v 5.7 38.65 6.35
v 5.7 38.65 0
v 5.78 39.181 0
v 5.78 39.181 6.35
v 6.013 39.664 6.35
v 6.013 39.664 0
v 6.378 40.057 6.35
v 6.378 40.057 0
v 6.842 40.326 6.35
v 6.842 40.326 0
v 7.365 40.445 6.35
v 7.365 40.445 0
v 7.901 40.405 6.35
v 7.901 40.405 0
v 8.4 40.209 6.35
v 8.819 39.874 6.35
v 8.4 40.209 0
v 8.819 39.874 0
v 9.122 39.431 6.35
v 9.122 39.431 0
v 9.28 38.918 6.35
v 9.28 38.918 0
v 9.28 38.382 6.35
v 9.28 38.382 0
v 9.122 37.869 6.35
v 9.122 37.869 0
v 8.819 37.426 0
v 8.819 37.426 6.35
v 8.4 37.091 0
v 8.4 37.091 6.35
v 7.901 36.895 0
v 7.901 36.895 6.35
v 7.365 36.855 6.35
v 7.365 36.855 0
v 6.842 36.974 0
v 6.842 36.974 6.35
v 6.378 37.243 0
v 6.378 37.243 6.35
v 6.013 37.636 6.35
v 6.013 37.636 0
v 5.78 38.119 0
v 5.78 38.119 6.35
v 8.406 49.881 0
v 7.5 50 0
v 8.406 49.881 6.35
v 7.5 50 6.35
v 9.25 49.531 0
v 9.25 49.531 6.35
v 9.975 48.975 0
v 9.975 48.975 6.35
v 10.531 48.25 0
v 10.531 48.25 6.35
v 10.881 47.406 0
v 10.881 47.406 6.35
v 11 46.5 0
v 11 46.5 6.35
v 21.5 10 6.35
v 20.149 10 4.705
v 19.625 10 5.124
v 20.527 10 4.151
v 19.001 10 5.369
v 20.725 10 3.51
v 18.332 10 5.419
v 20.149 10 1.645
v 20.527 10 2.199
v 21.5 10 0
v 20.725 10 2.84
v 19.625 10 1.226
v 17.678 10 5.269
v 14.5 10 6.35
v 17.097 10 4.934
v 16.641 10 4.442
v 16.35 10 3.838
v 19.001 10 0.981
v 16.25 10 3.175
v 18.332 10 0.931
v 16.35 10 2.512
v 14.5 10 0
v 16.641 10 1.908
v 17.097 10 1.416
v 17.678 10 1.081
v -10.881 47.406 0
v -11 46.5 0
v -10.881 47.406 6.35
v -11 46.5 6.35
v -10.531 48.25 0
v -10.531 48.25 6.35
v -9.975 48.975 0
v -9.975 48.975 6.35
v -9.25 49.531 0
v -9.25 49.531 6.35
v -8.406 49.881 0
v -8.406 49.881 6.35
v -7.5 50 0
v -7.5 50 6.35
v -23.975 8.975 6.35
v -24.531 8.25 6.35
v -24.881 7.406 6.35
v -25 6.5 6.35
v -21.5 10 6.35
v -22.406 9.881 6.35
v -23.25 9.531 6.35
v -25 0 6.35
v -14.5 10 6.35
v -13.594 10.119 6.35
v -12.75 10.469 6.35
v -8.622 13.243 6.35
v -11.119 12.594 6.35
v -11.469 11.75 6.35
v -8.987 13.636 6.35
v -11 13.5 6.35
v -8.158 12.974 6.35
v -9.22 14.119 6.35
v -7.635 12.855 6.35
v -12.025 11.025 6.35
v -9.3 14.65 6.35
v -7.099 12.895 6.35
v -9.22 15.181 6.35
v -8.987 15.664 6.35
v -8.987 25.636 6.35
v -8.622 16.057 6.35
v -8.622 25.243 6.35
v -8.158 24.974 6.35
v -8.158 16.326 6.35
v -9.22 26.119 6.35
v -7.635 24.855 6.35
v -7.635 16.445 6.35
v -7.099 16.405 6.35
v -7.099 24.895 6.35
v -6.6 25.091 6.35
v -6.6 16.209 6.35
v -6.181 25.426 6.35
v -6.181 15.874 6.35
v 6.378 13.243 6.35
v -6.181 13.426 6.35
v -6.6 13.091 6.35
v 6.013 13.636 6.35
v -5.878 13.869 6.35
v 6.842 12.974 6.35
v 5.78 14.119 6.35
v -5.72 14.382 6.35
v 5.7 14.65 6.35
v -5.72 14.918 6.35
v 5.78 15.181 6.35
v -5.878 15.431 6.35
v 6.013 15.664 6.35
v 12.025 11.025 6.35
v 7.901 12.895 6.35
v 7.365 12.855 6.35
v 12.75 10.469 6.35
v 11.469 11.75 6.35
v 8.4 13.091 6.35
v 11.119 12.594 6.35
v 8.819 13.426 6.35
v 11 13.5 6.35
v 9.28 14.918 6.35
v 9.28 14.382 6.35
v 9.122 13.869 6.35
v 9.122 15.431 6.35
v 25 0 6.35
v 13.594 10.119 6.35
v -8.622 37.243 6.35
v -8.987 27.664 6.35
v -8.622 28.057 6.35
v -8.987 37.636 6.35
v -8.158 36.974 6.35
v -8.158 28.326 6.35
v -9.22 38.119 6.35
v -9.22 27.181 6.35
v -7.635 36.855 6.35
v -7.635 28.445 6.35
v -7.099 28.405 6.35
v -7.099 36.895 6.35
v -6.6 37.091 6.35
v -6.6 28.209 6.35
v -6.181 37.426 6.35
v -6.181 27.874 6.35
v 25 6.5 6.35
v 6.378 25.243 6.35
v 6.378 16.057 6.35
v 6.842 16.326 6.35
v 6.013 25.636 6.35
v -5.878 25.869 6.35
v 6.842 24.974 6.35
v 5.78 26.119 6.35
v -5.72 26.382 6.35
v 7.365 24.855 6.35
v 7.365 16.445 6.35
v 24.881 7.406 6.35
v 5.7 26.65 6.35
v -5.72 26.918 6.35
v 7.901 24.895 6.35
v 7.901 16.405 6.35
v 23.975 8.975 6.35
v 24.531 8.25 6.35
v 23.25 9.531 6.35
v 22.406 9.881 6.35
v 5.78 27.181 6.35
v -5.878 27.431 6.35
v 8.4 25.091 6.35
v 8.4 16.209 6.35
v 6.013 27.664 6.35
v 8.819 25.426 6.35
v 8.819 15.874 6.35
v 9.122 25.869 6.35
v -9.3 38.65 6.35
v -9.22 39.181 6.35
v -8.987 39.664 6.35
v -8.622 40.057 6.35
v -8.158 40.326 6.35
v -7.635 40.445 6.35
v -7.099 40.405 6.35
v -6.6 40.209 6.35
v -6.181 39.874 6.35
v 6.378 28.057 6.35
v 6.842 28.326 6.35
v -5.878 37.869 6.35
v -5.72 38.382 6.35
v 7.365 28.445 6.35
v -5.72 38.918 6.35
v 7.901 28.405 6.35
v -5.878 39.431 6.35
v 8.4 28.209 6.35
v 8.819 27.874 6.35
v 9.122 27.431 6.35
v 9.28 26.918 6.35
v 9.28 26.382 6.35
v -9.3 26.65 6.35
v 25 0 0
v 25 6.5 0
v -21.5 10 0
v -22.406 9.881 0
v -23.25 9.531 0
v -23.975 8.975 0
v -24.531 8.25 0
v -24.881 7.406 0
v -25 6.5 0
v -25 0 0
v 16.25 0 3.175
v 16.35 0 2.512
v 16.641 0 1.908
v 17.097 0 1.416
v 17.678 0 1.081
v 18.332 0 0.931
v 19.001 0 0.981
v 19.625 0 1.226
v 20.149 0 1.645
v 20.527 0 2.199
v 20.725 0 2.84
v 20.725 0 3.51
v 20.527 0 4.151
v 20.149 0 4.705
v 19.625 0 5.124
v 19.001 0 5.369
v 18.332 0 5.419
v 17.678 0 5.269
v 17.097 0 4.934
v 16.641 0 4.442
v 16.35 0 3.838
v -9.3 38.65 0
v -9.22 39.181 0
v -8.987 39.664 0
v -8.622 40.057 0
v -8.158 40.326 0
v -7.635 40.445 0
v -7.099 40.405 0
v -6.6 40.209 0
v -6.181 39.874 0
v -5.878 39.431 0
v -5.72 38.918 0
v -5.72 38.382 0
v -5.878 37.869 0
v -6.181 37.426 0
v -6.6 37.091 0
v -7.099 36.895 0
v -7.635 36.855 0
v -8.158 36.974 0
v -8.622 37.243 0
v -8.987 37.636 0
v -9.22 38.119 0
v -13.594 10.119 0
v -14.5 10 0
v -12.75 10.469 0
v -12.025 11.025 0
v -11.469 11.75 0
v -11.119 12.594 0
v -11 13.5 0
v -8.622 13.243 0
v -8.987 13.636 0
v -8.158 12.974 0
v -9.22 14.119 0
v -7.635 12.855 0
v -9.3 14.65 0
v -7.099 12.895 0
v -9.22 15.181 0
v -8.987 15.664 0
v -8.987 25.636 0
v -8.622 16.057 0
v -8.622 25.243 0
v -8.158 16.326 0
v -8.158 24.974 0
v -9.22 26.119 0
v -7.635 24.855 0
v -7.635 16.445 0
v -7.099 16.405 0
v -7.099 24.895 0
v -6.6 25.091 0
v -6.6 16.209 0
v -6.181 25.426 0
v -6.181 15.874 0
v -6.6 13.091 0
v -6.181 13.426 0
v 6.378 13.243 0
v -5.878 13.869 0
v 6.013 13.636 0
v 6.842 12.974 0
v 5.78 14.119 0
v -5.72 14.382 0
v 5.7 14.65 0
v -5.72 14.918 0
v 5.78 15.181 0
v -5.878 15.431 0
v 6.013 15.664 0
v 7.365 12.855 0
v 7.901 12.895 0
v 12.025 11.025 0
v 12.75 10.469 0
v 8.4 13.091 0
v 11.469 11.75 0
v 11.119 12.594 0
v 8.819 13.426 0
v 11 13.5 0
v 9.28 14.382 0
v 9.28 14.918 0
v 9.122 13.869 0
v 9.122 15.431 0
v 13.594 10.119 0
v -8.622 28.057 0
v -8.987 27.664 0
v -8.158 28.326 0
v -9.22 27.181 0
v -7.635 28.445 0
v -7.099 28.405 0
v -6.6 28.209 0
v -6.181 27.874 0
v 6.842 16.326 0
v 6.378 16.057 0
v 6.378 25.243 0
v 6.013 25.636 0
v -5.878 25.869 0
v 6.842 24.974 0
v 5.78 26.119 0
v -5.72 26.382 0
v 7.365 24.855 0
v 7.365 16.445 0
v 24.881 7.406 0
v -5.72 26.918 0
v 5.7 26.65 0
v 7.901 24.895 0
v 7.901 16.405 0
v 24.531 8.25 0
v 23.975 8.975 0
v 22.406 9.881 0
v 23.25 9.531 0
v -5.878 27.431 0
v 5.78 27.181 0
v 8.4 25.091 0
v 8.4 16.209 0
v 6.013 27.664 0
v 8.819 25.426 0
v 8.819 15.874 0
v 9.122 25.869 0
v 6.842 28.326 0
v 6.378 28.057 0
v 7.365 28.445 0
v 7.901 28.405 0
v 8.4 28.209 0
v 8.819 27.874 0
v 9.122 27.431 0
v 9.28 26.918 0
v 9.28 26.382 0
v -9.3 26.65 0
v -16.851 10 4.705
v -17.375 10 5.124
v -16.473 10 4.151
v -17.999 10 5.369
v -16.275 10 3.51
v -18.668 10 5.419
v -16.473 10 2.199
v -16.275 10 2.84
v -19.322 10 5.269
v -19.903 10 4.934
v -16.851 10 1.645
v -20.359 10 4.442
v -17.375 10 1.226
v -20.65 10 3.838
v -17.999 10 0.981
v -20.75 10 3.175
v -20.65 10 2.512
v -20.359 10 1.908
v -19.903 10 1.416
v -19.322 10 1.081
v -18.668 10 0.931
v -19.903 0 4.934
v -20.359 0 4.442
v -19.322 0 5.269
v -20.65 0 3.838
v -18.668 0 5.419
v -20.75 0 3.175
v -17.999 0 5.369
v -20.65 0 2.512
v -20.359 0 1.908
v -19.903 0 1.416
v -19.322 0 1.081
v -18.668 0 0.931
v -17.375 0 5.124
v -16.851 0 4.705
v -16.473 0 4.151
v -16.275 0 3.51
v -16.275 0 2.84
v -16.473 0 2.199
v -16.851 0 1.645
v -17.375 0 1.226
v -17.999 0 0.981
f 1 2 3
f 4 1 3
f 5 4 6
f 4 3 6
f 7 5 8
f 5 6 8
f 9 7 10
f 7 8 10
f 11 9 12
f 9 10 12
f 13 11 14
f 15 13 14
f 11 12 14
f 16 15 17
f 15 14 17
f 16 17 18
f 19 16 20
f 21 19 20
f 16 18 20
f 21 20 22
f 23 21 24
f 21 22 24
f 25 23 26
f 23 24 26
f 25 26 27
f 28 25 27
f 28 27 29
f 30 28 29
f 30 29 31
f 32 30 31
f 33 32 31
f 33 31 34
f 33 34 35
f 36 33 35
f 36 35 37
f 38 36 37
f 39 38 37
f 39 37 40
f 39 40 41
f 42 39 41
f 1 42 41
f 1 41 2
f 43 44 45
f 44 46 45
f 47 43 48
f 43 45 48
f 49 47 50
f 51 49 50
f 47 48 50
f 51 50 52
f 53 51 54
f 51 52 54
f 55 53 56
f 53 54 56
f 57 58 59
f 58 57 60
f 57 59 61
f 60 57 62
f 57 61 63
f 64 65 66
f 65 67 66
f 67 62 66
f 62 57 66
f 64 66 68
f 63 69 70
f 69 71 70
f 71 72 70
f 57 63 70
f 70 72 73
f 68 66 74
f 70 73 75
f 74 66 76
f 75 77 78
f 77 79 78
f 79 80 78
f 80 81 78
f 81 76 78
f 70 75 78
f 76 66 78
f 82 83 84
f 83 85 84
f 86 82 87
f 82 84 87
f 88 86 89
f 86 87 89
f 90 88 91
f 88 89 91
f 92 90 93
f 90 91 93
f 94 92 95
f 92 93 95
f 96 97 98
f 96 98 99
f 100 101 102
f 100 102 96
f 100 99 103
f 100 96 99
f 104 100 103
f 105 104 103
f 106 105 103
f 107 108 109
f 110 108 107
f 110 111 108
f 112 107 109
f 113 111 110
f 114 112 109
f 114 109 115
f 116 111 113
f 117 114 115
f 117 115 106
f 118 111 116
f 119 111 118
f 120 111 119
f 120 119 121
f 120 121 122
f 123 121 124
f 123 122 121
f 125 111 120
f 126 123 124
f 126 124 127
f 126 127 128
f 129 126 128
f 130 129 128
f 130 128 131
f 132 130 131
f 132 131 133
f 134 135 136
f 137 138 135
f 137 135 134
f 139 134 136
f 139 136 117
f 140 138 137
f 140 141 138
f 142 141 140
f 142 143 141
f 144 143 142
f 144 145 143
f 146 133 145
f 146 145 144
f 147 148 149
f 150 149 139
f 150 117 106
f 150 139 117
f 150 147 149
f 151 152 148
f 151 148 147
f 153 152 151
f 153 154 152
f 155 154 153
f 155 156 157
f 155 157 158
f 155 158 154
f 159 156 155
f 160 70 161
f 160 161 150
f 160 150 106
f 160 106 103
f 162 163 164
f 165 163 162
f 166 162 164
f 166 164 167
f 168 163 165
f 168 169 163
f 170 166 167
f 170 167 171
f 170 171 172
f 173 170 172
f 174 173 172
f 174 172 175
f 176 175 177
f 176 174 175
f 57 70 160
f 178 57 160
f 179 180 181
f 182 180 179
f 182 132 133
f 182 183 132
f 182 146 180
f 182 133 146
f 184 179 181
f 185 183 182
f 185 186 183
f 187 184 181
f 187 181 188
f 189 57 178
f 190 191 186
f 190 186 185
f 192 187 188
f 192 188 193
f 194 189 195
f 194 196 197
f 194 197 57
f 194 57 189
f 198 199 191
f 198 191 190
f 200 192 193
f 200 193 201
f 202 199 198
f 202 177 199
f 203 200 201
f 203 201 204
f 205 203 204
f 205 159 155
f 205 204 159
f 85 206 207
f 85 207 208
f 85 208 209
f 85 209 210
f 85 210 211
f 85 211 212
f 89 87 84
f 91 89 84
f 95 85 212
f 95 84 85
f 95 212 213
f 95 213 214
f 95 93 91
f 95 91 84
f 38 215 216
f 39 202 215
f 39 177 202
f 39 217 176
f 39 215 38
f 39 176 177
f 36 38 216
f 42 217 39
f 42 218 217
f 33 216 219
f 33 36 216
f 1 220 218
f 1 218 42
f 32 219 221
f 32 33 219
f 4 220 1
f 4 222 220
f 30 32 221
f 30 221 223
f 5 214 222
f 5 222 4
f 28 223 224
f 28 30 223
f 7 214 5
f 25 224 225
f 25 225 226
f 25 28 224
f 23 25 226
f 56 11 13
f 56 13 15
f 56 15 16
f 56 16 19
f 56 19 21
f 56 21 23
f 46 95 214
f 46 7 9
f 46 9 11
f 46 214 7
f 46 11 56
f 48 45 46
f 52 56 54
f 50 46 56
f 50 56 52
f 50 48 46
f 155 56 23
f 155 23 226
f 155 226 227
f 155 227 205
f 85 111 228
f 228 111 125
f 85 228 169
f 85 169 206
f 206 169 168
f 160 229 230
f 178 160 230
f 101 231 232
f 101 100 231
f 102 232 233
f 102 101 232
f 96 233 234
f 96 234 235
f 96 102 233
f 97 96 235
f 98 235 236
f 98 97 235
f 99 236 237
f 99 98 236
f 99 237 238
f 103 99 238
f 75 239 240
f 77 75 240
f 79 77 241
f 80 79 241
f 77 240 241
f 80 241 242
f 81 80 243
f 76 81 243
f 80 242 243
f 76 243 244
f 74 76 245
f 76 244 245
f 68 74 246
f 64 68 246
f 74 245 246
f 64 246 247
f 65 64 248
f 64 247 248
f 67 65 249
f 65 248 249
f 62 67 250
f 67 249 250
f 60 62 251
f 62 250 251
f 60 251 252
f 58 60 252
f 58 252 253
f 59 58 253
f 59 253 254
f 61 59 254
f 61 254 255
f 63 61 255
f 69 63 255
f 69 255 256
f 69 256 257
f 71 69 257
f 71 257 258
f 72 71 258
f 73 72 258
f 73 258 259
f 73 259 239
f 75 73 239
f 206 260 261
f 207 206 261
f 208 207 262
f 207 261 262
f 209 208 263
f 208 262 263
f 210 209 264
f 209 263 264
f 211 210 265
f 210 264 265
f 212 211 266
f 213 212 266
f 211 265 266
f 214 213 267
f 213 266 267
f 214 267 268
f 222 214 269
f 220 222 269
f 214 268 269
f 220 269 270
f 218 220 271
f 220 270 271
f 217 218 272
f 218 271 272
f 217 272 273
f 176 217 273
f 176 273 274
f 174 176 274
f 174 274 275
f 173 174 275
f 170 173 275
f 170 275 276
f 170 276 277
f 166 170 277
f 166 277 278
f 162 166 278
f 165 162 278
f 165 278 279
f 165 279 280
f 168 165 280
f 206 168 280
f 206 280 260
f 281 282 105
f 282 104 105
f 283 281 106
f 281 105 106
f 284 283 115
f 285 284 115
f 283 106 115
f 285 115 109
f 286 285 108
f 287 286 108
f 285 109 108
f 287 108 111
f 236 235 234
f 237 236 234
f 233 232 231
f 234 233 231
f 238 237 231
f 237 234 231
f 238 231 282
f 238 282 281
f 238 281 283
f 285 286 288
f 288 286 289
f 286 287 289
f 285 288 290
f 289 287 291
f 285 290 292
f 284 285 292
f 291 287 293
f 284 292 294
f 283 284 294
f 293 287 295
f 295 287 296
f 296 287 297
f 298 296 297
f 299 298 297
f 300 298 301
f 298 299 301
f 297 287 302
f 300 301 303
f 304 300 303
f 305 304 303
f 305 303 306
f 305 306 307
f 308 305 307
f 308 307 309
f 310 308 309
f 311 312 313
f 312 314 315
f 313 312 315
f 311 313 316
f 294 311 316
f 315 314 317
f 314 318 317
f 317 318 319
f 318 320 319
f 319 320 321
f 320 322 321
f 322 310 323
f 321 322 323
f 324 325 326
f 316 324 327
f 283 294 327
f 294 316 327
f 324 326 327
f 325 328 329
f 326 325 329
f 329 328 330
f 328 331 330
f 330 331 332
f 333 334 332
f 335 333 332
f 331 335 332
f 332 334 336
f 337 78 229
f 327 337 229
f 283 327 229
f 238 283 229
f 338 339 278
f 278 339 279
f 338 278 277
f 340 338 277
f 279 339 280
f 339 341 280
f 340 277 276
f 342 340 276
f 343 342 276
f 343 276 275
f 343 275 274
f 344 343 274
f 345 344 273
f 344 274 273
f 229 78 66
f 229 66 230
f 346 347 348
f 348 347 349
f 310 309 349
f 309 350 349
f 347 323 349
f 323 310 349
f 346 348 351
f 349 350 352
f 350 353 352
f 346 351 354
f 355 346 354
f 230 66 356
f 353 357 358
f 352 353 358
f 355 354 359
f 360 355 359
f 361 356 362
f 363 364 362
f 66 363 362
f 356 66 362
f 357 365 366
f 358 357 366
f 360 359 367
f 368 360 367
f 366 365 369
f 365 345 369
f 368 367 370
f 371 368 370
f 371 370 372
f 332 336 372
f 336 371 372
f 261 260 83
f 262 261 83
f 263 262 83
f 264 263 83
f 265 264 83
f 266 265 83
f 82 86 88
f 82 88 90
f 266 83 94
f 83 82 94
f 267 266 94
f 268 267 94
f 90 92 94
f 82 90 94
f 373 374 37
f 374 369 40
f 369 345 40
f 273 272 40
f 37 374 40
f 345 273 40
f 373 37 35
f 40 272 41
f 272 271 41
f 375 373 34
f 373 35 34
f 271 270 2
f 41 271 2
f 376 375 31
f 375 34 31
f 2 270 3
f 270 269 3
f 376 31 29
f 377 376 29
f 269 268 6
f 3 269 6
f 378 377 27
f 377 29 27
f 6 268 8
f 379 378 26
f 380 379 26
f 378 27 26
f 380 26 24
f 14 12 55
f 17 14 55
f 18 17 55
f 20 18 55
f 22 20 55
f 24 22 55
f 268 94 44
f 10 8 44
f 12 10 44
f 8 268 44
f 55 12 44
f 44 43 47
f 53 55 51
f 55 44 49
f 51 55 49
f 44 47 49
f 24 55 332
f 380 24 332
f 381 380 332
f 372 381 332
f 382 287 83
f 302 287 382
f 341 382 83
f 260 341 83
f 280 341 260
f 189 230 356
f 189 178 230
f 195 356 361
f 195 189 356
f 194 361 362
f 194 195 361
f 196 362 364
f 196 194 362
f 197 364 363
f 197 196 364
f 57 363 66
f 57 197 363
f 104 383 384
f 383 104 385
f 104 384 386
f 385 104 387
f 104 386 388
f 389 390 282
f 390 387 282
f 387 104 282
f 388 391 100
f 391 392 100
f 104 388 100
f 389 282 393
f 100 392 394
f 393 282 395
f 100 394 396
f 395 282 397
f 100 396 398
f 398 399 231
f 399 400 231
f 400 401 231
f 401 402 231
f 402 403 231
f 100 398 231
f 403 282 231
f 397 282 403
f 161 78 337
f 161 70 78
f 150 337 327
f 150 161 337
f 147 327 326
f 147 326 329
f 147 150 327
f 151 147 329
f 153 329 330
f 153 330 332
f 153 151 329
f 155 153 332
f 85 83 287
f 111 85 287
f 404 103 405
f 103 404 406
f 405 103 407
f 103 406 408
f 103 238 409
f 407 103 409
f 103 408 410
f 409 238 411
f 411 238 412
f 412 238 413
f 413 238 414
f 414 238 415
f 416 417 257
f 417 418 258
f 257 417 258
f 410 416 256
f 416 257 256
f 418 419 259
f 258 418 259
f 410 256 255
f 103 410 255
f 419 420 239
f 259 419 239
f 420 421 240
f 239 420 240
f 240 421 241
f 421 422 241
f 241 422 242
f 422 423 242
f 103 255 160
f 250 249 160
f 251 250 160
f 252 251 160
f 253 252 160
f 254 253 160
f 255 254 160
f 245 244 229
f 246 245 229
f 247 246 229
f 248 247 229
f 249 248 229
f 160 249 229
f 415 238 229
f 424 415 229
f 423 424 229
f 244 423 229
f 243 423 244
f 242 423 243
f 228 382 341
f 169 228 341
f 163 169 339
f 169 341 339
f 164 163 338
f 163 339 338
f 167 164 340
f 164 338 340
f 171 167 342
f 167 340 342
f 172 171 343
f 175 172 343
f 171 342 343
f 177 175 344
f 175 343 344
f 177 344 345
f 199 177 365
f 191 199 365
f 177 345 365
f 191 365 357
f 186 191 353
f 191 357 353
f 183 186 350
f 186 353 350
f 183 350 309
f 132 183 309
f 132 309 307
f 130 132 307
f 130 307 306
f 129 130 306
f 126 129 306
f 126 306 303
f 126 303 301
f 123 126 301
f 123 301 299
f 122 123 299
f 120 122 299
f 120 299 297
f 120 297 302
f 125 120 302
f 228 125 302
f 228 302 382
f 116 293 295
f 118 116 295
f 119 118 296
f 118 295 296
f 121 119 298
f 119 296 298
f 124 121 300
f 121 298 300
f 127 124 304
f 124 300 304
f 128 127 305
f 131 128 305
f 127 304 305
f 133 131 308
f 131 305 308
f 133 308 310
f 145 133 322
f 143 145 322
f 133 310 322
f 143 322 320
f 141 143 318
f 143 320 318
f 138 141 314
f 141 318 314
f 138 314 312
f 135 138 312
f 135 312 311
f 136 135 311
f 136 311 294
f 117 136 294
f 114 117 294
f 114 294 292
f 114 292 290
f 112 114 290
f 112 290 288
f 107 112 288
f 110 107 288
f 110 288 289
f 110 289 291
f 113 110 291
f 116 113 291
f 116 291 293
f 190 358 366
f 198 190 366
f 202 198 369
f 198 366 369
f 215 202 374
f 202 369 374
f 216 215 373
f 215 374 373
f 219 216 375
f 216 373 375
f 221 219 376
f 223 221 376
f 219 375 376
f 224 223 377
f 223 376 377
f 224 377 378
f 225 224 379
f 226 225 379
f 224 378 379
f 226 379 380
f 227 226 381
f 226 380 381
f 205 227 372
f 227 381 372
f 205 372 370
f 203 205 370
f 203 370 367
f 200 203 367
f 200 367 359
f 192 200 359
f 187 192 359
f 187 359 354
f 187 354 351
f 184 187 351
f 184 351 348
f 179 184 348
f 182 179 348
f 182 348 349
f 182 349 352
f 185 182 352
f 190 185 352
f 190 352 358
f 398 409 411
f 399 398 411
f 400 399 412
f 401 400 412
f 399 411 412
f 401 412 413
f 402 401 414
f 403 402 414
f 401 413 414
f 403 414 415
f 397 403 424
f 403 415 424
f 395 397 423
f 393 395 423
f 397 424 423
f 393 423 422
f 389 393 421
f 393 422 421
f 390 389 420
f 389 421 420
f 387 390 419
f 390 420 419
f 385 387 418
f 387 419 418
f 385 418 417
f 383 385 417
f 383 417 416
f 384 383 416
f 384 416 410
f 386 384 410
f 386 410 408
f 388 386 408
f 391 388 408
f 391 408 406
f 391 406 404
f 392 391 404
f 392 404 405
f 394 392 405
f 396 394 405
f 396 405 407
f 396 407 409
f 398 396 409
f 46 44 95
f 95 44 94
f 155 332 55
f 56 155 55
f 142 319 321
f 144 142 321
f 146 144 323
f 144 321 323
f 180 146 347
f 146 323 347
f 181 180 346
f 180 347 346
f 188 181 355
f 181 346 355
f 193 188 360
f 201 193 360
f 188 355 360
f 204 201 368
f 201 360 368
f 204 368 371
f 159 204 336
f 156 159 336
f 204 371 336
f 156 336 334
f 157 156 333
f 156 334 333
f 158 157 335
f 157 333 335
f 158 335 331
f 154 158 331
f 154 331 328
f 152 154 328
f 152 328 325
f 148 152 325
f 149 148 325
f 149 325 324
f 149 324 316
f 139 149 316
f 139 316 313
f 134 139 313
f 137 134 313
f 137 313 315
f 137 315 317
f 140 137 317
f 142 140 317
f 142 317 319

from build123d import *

# Parameters (mm, degrees)
BOSS_EXTRUDE1_DEPTH  = 6.35
M4_CLEARANCE_HOLE1_D = 4.5
M3_CLEARANCE_HOLE2_D = 3.6
FILLET1_R            = 3.5
FILLET2_R            = 3.5


with BuildPart() as part:
    # Sketch1 → Boss-Extrude1 (new body)
    with BuildSketch(Plane.XY):
        Polygon((-25, 0), (25, 0), (25, 10), (11, 10), (11, 50), (-11, 50), (-11, 10), (-25, 10), align=None)
    extrude(amount=BOSS_EXTRUDE1_DEPTH)

    # M4 Clearance Hole1 (through all)
    with Locations(Plane(origin=(0, 10, 0), x_dir=(1, 0, 0), z_dir=(0, 1, 0))):
        with Locations((-18.5, -3.175), (18.5, -3.175)):
            Hole(M4_CLEARANCE_HOLE1_D / 2)

    # M3 Clearance Hole2 (through all)
    with Locations(Plane.XY.offset(6.35)):
        with Locations((-7.5, 26.65), (7.5, 38.65), (-7.5, 14.65), (7.5, 26.65), (-7.5, 38.65), (7.5, 14.65)):
            Hole(M3_CLEARANCE_HOLE2_D / 2)

    # Fillet1
    fillet1_edges = [part.edges().sort_by_distance(p)[0] for p in [
        (-11, 10, 3.175),
        (11, 10, 3.175),
    ]]
    fillet(fillet1_edges, radius=FILLET1_R)

    # Fillet2
    fillet2_edges = [part.edges().sort_by_distance(p)[0] for p in [
        (-25, 10, 3.175),
        (-11, 50, 3.175),
        (11, 50, 3.175),
        (25, 10, 3.175),
    ]]
    fillet(fillet2_edges, radius=FILLET2_R)


solid = part.part
